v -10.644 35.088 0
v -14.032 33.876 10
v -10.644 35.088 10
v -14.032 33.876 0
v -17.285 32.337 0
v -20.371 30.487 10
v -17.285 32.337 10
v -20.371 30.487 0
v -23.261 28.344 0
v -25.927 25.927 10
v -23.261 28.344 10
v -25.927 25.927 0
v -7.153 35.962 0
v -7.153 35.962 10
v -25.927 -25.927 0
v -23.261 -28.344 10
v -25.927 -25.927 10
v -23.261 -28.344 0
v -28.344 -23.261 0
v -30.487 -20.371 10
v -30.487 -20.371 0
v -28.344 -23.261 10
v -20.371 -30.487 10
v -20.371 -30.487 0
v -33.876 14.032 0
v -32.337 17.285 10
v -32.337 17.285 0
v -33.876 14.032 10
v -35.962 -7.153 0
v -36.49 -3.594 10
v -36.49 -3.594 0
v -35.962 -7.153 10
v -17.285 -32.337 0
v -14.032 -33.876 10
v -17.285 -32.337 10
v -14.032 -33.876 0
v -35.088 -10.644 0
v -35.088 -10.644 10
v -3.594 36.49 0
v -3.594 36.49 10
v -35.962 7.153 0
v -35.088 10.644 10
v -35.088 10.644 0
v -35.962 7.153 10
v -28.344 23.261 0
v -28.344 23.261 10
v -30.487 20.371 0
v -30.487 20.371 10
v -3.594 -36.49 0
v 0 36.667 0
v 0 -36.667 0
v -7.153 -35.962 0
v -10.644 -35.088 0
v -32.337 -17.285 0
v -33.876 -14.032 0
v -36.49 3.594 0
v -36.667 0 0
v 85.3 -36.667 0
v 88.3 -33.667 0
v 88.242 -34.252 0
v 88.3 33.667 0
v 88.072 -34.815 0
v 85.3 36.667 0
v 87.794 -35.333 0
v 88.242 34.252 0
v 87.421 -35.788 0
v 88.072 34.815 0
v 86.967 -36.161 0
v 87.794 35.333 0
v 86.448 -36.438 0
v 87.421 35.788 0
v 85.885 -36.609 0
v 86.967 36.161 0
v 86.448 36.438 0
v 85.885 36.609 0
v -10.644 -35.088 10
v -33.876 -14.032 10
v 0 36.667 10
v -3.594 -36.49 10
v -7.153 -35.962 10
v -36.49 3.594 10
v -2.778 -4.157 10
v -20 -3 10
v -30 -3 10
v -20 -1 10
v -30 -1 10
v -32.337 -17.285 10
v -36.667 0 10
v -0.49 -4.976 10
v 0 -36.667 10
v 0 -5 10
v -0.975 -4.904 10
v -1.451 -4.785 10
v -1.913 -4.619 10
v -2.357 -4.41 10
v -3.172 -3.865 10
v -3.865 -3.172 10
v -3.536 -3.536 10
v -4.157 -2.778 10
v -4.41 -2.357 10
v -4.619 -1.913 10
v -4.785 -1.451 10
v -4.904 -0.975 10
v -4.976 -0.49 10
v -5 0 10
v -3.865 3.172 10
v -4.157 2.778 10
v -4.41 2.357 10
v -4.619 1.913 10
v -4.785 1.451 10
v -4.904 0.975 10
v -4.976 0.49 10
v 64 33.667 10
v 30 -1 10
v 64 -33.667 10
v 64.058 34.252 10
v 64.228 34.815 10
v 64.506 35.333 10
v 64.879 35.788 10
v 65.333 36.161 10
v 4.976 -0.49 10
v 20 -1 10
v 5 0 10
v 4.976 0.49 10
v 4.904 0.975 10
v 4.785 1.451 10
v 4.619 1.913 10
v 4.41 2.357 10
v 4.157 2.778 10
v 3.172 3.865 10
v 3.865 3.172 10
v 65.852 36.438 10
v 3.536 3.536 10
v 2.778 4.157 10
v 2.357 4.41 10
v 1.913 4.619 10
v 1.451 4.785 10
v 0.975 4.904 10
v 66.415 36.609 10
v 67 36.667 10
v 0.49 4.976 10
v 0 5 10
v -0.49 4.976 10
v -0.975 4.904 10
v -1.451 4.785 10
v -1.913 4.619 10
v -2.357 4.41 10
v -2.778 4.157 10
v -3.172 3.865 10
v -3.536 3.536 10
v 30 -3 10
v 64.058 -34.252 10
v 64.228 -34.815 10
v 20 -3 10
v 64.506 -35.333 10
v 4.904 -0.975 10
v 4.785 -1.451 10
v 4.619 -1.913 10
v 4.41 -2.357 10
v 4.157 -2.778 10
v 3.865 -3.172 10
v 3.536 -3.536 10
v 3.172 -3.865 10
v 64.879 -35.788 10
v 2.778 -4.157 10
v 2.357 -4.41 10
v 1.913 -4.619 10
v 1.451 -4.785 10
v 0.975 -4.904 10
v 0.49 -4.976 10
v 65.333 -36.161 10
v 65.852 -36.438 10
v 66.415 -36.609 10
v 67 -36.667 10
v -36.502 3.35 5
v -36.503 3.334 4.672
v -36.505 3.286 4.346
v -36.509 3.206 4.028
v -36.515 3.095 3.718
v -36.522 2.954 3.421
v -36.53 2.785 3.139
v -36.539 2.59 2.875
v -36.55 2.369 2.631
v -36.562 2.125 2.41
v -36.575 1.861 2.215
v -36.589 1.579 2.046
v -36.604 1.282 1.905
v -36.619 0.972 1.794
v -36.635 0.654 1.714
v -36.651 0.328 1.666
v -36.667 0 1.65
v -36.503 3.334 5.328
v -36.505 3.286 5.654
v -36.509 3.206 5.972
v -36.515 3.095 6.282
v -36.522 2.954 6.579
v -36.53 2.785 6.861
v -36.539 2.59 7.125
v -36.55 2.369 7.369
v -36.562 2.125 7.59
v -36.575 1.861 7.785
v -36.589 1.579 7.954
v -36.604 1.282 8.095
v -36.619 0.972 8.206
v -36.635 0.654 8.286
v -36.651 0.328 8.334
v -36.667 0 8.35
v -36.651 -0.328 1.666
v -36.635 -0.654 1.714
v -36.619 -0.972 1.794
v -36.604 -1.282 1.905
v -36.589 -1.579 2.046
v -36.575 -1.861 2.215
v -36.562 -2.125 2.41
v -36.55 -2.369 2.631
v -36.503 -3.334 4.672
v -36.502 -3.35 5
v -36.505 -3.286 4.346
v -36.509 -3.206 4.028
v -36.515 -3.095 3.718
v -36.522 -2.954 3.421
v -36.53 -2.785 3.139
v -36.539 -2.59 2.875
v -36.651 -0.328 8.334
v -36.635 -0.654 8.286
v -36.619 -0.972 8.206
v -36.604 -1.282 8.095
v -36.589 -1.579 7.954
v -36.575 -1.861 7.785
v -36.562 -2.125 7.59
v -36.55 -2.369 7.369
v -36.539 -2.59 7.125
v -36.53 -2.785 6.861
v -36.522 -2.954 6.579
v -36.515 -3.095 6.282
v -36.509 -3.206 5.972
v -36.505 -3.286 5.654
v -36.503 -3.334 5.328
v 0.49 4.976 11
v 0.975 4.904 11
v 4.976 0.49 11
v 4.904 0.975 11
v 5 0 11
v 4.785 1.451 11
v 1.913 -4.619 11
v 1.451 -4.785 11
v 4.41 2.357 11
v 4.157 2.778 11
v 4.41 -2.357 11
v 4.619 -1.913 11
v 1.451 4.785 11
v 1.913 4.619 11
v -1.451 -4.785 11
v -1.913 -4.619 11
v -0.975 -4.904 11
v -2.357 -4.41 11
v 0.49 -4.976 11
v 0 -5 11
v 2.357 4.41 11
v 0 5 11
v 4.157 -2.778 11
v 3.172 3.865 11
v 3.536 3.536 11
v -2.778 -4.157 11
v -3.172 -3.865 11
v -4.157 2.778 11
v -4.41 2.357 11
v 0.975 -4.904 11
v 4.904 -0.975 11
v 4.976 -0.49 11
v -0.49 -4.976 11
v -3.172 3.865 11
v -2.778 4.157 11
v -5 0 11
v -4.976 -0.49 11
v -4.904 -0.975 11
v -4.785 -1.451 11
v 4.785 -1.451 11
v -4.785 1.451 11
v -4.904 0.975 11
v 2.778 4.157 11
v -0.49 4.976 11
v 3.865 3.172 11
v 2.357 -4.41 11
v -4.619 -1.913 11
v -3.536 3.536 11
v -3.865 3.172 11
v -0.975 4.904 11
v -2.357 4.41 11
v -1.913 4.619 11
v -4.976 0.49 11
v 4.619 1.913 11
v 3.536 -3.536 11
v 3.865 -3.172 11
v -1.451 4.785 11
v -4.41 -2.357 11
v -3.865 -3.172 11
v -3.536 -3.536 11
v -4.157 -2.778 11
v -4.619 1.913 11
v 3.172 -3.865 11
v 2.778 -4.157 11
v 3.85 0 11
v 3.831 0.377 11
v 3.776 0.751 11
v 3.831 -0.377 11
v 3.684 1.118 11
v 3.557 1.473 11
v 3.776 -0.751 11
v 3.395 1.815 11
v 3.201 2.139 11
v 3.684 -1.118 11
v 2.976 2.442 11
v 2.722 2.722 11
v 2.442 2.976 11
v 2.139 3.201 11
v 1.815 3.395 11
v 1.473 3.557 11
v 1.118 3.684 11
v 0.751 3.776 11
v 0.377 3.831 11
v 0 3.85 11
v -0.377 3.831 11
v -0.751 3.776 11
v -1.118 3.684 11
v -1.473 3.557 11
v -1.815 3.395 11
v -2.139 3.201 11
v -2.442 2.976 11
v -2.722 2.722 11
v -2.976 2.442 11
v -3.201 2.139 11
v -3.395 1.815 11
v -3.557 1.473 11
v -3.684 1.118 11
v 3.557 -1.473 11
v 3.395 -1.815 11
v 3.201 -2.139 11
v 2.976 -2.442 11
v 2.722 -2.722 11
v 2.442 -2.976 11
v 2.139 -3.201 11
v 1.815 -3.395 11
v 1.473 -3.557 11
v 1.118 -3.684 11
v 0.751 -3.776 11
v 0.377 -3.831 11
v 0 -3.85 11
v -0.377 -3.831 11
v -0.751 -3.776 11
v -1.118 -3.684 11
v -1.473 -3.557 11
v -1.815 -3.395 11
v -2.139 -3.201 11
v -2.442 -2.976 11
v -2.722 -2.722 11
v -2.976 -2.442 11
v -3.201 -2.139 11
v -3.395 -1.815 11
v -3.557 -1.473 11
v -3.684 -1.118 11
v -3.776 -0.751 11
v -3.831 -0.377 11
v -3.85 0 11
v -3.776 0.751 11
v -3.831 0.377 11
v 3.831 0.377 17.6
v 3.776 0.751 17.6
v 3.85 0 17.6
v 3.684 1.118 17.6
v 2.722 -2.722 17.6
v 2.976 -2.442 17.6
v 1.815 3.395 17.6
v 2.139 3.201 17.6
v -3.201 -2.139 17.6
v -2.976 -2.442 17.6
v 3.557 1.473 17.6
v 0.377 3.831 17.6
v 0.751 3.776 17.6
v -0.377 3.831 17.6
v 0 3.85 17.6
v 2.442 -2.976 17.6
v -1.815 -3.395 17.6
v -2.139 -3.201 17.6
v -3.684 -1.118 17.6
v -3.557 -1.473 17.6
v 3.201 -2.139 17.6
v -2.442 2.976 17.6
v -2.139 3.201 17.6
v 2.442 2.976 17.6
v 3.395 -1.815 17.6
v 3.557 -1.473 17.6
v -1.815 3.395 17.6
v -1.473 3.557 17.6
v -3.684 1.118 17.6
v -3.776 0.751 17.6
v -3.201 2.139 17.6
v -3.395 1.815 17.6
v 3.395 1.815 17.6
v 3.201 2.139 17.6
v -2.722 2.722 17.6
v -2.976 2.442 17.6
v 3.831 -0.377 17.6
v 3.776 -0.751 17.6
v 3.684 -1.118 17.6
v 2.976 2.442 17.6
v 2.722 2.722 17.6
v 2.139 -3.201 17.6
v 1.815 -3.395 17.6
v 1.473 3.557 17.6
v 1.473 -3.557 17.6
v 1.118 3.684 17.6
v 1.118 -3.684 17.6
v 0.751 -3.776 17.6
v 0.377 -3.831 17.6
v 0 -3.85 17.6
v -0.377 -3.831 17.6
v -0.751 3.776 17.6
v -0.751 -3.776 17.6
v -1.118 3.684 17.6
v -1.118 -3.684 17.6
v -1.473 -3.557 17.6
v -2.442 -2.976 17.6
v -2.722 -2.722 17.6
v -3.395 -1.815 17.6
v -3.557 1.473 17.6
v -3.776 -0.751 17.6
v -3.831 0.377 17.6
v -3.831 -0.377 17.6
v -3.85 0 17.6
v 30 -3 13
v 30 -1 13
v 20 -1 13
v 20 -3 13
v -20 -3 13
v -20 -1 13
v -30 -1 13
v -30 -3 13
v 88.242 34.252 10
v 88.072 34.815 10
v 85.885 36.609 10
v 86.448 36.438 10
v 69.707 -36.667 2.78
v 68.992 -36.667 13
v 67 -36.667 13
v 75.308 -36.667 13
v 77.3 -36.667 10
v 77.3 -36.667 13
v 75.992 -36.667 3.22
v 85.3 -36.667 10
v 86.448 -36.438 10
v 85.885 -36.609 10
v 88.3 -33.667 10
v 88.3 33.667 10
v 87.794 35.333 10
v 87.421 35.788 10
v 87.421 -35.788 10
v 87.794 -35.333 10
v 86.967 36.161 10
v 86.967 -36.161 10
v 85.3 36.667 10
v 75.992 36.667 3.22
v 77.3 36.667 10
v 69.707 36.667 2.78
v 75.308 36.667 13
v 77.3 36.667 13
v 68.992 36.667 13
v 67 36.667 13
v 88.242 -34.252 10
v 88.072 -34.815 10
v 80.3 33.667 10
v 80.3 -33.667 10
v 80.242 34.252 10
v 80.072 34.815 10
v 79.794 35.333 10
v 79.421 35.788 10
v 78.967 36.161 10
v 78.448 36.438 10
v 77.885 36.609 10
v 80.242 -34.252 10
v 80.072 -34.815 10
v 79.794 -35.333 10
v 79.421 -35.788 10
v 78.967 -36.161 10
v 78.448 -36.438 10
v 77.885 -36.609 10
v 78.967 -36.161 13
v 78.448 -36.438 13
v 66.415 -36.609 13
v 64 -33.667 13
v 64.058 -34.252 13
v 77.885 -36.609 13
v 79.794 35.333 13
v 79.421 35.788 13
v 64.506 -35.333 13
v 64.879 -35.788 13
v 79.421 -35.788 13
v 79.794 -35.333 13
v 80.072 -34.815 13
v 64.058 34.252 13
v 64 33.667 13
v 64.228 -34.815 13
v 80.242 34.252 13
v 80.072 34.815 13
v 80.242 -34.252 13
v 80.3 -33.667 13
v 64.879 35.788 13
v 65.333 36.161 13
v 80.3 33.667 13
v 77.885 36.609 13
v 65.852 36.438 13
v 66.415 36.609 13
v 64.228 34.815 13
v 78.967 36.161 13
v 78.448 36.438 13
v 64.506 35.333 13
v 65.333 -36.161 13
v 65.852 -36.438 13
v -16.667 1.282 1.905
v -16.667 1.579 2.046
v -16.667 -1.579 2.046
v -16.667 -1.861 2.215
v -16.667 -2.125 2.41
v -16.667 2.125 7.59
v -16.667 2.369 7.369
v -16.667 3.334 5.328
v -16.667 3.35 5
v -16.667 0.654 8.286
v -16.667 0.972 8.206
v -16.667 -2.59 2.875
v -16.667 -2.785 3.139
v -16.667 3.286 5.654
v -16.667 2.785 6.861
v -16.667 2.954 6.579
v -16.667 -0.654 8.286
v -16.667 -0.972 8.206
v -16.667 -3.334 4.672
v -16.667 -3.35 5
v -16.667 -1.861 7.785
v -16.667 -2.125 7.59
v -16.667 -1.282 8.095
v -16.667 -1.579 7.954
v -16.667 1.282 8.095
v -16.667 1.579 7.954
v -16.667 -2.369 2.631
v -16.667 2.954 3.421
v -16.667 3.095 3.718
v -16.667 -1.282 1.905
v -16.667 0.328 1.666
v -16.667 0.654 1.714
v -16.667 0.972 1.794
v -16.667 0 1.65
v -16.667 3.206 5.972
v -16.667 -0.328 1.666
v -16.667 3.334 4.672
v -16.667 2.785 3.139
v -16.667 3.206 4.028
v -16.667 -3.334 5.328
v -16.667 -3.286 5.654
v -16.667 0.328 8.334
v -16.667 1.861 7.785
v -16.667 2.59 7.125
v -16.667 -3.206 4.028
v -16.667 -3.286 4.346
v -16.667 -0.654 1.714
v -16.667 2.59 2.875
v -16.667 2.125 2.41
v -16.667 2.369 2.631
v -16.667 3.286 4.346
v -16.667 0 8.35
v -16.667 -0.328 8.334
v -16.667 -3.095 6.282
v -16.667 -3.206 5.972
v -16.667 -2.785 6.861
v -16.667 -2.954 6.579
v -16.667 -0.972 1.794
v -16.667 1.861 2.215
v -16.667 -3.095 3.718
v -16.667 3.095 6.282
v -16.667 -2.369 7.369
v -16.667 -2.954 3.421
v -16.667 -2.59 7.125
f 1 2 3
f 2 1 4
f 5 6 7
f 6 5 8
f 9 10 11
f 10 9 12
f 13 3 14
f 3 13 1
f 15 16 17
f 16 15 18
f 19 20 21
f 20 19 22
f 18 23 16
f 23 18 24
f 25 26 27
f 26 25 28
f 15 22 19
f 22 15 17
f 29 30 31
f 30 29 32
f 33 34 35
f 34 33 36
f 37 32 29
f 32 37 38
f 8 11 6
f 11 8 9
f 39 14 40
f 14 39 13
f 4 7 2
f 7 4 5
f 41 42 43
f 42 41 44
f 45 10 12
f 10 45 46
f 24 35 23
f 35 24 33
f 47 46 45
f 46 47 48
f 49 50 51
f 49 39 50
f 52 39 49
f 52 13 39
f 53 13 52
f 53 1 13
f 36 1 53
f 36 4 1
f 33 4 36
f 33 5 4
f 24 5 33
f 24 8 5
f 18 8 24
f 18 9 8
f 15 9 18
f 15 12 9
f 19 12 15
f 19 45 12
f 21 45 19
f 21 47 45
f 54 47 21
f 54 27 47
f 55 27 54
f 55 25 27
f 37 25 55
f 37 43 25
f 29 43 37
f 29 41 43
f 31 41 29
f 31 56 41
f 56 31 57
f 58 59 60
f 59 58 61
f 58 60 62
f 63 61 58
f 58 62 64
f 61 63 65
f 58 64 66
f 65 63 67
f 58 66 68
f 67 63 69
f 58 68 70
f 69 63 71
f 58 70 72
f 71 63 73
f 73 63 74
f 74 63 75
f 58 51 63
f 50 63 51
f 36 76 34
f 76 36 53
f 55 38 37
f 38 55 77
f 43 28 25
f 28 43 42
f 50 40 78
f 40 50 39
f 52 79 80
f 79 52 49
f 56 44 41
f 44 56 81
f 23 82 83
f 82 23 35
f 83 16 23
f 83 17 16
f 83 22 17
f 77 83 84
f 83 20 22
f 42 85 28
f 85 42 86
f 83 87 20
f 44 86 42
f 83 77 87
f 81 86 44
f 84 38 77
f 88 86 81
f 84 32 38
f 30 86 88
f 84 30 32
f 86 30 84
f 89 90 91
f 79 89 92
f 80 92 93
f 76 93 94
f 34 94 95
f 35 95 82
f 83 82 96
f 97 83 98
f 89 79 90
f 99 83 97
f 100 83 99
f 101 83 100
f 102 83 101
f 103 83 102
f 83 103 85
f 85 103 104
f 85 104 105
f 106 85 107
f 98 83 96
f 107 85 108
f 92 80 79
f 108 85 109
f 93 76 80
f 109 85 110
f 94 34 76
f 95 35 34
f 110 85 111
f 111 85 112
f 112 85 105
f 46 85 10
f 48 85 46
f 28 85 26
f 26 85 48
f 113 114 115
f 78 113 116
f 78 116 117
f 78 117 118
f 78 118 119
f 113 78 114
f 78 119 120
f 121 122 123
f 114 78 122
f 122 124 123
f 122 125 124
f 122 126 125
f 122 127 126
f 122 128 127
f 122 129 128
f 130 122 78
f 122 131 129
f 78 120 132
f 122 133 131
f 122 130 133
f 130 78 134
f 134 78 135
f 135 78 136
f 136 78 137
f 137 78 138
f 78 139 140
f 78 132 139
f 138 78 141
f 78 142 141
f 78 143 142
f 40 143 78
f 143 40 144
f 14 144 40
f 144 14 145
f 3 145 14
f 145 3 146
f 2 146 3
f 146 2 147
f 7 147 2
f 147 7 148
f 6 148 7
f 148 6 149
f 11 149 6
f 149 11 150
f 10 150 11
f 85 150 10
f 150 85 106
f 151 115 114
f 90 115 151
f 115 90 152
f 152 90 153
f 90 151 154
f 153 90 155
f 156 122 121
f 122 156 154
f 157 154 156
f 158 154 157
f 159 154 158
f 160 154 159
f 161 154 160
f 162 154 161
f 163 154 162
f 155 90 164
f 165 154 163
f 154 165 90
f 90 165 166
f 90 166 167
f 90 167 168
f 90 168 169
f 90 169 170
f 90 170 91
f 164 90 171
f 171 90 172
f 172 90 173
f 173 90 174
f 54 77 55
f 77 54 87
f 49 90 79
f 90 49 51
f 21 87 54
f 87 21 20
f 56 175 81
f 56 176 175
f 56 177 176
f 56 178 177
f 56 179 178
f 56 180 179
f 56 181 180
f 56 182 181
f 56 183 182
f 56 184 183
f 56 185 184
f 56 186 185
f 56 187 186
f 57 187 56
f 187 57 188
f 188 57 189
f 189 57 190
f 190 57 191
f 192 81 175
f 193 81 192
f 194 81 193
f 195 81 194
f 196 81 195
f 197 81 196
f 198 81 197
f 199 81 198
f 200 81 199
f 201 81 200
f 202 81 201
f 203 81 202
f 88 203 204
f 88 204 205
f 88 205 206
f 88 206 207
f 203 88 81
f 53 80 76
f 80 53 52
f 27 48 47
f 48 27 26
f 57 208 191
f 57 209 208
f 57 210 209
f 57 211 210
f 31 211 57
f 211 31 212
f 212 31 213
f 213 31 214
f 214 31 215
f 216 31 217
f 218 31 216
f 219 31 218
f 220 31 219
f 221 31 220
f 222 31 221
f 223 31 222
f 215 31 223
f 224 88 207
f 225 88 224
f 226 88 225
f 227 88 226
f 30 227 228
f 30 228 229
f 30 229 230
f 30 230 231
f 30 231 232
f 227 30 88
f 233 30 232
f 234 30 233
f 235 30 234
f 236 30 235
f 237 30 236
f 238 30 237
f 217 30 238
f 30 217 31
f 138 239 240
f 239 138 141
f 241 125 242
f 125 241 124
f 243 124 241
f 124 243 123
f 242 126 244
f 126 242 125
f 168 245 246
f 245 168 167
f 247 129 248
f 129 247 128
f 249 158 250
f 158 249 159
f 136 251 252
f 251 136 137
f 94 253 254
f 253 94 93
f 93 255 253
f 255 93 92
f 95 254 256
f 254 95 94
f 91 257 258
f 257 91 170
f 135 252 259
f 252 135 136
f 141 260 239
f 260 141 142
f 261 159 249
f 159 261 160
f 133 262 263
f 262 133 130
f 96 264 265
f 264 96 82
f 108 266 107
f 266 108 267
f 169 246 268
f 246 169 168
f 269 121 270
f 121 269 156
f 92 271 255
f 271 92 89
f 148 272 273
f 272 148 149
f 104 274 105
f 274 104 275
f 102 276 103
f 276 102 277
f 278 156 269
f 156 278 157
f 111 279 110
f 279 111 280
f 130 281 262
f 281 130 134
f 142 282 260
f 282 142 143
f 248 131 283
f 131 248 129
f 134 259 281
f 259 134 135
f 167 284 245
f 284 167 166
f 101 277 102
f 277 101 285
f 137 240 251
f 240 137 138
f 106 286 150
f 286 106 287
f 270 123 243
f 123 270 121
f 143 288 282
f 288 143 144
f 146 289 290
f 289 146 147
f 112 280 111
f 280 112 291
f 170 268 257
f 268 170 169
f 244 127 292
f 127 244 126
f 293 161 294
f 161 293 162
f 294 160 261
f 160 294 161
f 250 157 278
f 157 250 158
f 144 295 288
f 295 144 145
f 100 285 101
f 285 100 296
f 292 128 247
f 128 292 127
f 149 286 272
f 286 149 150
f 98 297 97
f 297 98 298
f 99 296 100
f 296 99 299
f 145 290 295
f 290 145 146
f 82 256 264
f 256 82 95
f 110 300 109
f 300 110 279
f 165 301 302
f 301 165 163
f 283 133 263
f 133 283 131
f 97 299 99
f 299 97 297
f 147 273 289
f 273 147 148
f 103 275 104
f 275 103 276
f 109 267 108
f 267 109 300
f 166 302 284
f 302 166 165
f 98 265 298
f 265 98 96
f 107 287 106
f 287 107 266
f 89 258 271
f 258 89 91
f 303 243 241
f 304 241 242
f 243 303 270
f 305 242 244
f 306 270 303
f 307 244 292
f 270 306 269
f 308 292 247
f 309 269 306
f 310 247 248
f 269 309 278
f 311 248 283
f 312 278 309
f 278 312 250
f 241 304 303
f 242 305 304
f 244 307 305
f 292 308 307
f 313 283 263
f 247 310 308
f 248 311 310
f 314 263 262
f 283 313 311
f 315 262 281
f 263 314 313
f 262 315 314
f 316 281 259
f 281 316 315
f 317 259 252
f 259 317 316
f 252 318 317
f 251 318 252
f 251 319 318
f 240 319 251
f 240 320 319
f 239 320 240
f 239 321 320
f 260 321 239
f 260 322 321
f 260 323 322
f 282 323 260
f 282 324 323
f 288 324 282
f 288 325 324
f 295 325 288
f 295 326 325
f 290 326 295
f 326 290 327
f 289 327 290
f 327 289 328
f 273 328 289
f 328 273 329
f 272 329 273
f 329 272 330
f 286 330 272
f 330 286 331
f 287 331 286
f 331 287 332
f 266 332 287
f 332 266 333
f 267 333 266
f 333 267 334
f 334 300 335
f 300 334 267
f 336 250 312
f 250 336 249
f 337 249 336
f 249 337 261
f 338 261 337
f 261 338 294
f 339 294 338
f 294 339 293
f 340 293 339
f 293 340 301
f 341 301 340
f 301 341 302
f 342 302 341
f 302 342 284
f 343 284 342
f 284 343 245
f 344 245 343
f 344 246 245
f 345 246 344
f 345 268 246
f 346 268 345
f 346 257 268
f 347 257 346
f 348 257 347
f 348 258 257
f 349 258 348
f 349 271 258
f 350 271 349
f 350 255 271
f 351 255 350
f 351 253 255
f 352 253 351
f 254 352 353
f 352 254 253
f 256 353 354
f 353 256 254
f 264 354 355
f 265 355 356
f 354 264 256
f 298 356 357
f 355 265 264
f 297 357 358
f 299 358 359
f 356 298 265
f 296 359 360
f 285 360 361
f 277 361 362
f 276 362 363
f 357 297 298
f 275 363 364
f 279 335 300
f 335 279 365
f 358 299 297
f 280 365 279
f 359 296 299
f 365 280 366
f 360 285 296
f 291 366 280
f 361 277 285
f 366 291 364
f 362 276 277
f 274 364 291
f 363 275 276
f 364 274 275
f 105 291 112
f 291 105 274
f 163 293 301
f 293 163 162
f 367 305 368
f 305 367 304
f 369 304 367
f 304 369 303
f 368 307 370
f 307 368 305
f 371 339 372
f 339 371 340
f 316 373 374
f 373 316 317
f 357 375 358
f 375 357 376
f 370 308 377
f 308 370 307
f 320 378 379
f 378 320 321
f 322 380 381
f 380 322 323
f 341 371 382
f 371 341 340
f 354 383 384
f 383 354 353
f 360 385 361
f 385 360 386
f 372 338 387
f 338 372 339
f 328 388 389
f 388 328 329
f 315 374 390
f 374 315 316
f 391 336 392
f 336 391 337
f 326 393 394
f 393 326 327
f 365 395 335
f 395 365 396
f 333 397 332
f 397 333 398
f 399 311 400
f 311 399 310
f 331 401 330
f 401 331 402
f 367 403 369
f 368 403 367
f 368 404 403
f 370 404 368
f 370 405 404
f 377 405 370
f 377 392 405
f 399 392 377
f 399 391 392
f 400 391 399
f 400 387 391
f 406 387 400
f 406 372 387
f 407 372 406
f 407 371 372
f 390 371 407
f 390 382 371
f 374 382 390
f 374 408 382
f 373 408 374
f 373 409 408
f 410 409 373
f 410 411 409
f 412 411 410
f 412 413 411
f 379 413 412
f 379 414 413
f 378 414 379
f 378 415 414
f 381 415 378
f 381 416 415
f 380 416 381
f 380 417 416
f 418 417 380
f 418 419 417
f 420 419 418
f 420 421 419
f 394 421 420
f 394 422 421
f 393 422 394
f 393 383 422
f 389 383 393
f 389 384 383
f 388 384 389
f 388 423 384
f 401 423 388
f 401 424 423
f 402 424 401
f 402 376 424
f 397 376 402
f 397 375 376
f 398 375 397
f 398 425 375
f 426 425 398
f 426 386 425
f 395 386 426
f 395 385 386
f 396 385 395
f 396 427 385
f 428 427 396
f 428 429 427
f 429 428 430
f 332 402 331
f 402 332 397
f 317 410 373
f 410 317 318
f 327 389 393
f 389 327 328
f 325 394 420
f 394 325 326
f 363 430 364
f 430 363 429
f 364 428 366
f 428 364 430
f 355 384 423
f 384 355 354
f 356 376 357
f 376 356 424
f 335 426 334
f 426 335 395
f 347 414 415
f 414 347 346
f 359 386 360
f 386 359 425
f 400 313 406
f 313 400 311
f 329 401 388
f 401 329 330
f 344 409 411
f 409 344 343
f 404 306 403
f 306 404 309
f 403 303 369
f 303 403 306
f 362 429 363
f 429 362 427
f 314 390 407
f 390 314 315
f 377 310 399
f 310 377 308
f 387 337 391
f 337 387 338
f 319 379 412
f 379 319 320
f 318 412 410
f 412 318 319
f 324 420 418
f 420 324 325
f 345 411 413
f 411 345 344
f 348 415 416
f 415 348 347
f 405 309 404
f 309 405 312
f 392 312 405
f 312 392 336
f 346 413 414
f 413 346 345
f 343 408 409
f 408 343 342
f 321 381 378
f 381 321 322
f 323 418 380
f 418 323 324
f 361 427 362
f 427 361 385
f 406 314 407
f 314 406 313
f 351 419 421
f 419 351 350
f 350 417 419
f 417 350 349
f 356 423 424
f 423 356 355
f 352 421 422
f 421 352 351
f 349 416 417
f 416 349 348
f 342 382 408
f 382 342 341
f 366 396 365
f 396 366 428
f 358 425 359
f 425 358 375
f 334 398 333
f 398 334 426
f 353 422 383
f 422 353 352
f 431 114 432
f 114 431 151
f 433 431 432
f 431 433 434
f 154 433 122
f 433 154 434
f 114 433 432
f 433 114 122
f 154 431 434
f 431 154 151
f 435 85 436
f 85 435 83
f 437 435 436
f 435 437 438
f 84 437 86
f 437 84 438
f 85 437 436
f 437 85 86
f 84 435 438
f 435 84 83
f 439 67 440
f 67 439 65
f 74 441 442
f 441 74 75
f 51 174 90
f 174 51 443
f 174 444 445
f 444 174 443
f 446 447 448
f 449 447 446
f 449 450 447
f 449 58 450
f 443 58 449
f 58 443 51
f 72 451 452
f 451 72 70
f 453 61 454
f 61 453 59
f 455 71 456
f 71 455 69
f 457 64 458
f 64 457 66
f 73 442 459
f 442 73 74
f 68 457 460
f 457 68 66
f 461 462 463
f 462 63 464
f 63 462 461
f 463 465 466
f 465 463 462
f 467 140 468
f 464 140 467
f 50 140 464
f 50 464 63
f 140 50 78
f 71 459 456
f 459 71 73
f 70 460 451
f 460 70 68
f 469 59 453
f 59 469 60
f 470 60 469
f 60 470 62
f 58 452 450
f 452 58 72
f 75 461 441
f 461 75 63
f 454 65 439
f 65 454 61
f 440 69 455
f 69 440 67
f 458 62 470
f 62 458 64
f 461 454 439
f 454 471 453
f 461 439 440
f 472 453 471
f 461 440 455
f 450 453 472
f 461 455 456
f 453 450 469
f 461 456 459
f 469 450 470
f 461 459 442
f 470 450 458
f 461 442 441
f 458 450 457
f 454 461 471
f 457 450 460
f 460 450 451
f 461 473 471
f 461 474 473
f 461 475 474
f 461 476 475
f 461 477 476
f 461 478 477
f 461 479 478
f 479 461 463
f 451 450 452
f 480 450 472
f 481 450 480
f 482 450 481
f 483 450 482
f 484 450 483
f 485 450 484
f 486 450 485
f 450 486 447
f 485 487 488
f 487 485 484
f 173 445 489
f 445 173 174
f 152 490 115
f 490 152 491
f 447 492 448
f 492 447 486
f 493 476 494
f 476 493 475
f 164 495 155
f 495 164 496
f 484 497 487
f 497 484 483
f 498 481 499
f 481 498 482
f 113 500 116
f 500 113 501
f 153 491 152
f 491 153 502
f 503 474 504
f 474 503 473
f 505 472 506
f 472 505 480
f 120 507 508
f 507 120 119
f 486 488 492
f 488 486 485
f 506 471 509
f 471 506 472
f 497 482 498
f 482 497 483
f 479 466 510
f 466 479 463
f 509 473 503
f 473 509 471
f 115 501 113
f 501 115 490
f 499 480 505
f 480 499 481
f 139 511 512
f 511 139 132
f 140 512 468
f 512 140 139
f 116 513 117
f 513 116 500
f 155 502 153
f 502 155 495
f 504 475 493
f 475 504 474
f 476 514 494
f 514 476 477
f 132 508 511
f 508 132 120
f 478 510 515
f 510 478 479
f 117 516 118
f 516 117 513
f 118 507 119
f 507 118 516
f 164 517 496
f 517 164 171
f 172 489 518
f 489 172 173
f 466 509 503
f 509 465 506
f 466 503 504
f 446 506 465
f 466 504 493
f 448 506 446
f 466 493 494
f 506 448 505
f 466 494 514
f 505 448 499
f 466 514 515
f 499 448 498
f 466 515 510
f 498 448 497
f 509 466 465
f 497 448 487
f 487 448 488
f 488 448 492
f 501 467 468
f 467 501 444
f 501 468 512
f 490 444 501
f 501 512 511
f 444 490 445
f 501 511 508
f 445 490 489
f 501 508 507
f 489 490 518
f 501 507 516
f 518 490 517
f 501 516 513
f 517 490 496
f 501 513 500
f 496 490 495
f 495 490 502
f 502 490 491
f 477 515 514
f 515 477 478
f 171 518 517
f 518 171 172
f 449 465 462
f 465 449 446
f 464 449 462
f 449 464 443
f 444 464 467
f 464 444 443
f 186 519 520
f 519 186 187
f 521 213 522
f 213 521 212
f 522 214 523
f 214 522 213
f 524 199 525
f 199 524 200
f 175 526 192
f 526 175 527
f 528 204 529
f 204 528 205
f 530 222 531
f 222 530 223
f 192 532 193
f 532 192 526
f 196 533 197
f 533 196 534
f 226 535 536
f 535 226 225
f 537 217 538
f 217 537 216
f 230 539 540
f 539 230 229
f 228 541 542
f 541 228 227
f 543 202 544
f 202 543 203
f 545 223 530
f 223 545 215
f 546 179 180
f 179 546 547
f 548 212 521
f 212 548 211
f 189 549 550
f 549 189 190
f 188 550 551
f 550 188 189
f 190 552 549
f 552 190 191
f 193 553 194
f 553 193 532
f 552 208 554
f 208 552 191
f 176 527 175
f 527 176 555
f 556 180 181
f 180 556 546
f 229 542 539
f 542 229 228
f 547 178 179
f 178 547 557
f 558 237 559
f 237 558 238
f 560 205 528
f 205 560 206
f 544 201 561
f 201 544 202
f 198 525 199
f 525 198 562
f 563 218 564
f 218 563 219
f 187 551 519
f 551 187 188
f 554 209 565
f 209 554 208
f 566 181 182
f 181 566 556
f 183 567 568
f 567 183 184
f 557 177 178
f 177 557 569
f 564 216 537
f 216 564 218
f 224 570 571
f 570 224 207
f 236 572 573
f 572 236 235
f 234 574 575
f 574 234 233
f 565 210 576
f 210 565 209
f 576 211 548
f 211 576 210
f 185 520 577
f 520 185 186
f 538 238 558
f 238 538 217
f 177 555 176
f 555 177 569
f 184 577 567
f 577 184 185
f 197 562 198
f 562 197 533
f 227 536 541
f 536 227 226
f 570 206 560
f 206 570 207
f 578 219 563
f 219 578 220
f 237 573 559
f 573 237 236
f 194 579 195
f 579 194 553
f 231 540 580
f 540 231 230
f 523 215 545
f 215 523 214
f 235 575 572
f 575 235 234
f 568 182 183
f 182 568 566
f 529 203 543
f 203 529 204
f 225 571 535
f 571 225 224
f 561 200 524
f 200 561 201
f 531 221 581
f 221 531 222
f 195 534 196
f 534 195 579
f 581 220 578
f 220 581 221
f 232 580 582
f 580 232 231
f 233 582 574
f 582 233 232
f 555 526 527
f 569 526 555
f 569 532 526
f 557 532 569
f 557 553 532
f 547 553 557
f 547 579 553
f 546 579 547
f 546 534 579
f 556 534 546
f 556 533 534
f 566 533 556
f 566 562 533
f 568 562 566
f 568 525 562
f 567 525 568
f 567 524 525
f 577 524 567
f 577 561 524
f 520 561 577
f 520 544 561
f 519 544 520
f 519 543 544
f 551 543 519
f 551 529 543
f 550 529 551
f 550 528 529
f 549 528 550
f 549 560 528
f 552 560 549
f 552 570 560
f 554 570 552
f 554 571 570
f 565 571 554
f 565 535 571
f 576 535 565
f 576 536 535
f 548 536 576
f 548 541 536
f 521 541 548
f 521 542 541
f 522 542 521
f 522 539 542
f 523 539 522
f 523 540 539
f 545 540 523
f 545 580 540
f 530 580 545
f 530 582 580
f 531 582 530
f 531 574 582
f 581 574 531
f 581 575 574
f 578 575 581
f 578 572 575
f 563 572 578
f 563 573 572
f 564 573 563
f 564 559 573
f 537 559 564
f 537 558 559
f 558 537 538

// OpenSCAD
// ===================================================================
// Mirror + Spinner Stand (stationary base)
//
// The stationary half of the lazy-susan mirror stand: merges the
// lazy-susan base disc with the leaning mirror stand into one solid
// piece. The rotating 3-arm spinner that sits on top is a separate
// part -- see spinner.scad.
//
// The mirror stand's flat plate overlaps the lazy susan's stationary
// base disc all the way to the disc's center (the spinner axis),
// rather than just touching its edge. The disc stays a full circle
// underneath (so the small center post that the spinner's bearing
// insert mounts to stays solid, not cut in half) but the rectangle
// covers its entire back half, so in silhouette the fused base reads
// as a true Norman window -- a semicircle capping a rectangle, one
// continuous outline with no notch, gap, or seam.
//
// Only the raised boss (the part tall enough to reach the spinner's
// rotation plane) is set back far enough that it sits mirror_clearance
// mm beyond the circle the spinner's arm tips sweep out (spinner_
// sweep_radius below, which must match spinner.scad's own value), so
// the arms spin freely and just barely miss it. The thin flat plate
// itself can safely run right through the spinner's footprint because
// it's well below spinner height -- only the boss needs the clearance.
//
// An optional pair of tabs rises from the base's floor and interlocks
// with a matching tab on the underside of the spinner's pointed
// (90-degree) arm (see spinner.scad's spinner_stop_tab()) to limit the
// spinner to exactly 180 degrees of travel: from the pointer aimed at
// the mirror to aimed directly away from it. Toggle it with
// has_rotation_stop below; spinner.scad has its own independent
// toggle for its half of the mechanism, so set both true for the stop
// to actually work.
//
// Axes: X/Y = footprint, Z = up, sits on Z = 0. The base disc is
// centered on the origin (the spinner axis); the mirror stand sits
// behind it along +X, centered on Y = 0, leaning back away from the
// spinner (its mirror faces toward -X, i.e. toward the spinner).
// ===================================================================

/* [Lazy susan base dimensions (mm)] */
base_height_no_tether = 3;    // thickness of the base disc when has_tether_dowel is false; when true, the disc is instead made as thick as tether_base_height so the tether hole sits fully within it -- see base_height below
base_radius           = 110 / 3;  // must match object_width / 3, where object_width matches spinner.scad
base_center_diameter = 10;
base_center_extra    = 1;    // center cylinder rises this much above base_height
base_top_extra       = 6.6;  // top post rises this much above center cylinder
base_top_radius      = 3.85;

/* [Mirror] */
mirror_base_depth = 6;   // front-to-back thickness of the mirror's plastic base

/* [Mirror lean] */
lean_angle = 86;          // desired angle of the mirror from horizontal (90 = vertical)
tilt = -(90 - lean_angle); // negative so the slot leans the mirror toward its front edge

/* [Mirror slot] */
eps = 0.3;                            // clearance so the mirror base slides in freely
slot_gap   = mirror_base_depth + eps; // front-to-back width of the slot
slot_depth = 10;                      // vertical depth of the (blind) slot

/* [Mirror stand base] */
// stand_width matches the lazy-susan base disc's diameter, and
// plate_thickness matches base_height, and front_apron is derived from
// the spinner clearance below (under Derived values) -- see there for
// why these aren't free parameters here.
back_apron      = 13;   // X: plate material behind the slot
floor_thickness = 3;    // solid material below the slot floor (within the boss)
boss_margin     = 5;    // X: extra boss material in front of and behind the slot

/* [Mirror stand corners] */
plate_corner_radius = 3;  // rounding radius of the plate's back two footprint corners
boss_corner_radius  = 3;  // rounding radius of the boss's footprint corners
corner_fn = 32;            // smoothness of the rounded corners

/* [Fit between spinner and mirror stand] */
// Radius of the circle swept by the spinner arms' rounded tips (arm_length
// + arm_width / 2 in spinner.scad); must match spinner.scad's
// spinner_sweep_radius.
spinner_sweep_radius = 62.5;
// Extra gap, beyond the bare minimum, between that swept circle and the
// mirror stand's front edge.
mirror_clearance = 1.5;

/* [Rotation stop] */
has_rotation_stop = true;  // adds the two tabs that limit spinner rotation to 180 degrees; must match spinner.scad's has_rotation_stop for the stop to work
// A tab hanging below the spinner's pointed (90-degree) arm, plus two
// matching tabs rising from the base, limit the spinner to exactly 180
// degrees of rotation: from the pointed arm aimed at the mirror to
// aimed directly away from it. All three tabs share the same radial
// span and width; see the Derived values / module comments below for
// how they're positioned to interlock.
stop_width = 2;   // mm, tangential width of each stop tab; must match spinner.scad
stop_r_in  = 20;  // mm, inner radius of the stop tabs; must match spinner.scad
stop_r_out = 30;  // mm, outer radius of the stop tabs; must match spinner.scad
stop_rise  = 3;   // mm, how far the base's tabs rise above the floor

/* [Tether dowel hole (mm)] */
// Bores a horizontal hole into the lazy-susan base disc's edge, on the
// opposite side from the mirror, sized for a dowel that ties this
// stand to dowel-stand.scad at a fixed distance. Toggle it with
// has_tether_dowel below; dowel-stand.scad has its own independent
// toggle for its matching hole, so set both true to use the tether.
// Also thickens the base disc (see tether_base_height) so the hole
// sits fully within it, not breaking through the top or bottom face.
// Since the hole is bored into the disc rather than protruding above
// it, it needs no clearance from the spinner regardless of depth.
has_tether_dowel   = true;
dowel_diameter     = 6.7; // actual diameter of the connecting dowel; must match dowel-stand.scad and window.scad
hole_clearance     = 0;   // added to dowel_diameter for a snug press/slide fit; must match dowel-stand.scad and window.scad
tether_base_height = 10;  // mm, thickness the base disc is made when has_tether_dowel is true (replacing base_height_no_tether), giving the hole enough surrounding material
dowel_hole_depth   = 20;  // mm, how deep this hole is bored into the base disc from its edge; must match dowel_hole_depth in dowel-stand.scad and window.scad

/* [Preview / debug helpers] */
stand_color = "DeepSkyBlue";

$fn = 64;

// Computed ahead of the checks below (rather than in the main Derived
// values section further down) because those checks depend on them:
// when the tether dowel is enabled, the disc's thickness matches
// tether_base_height so the tether hole sits fully within the full
// slab, top and bottom, instead of breaking through.
base_height  = has_tether_dowel ? tether_base_height : base_height_no_tether;
dowel_hole_d = dowel_diameter + hole_clearance;

// ===== Checks =====
assert(base_height > 0 && base_radius > 0,
    "base_height and base_radius must be positive");
assert(base_center_diameter > 0 && base_top_radius > 0,
    "base_center_diameter and base_top_radius must be positive");
assert(mirror_clearance >= 0, "mirror_clearance must not be negative");
assert(stop_width > 0, "stop_width must be positive");
assert(stop_r_in > 0 && stop_r_in < stop_r_out,
    "stop_r_in must be positive and less than stop_r_out");
assert(stop_r_out < base_radius,
    "stop_r_out must be less than base_radius so the away-from-mirror base tab has a full disc under it");
assert(stop_rise > 0, "stop_rise must be positive");
assert(!has_tether_dowel || tether_base_height > dowel_hole_d,
    "tether_base_height must be larger than the dowel hole diameter so the tether hole doesn't break through the disc's top or bottom face");
assert(!has_tether_dowel || dowel_hole_depth > 0,
    "dowel_hole_depth must be positive");
// The hole is centered on Y=0, pointing straight at the spinner axis,
// so its blind end must stay far enough from the origin (by its own
// radius, plus the center post's) to not break into the center post.
assert(!has_tether_dowel ||
    base_radius - dowel_hole_depth > dowel_hole_d / 2 + base_center_diameter / 2,
    "dowel_hole_depth is too deep and would break into the center post; decrease dowel_hole_depth");

// ===== Derived values =====

// The mirror stand's width matches the lazy-susan base disc's diameter,
// so the stand reads as a continuation of the disc rather than a
// mismatched width.
stand_width = 2 * base_radius;

// The mirror plate is the same thickness as the lazy-susan base, so
// the two flat footprints fuse into one seamless "Norman window" shape
// (circle + rectangle, sharing one flat top face) with no bridge piece
// and no seam.
plate_thickness = base_height;

// Front-to-back footprint of the mirror stand's slot boss.
boss_depth = slot_gap + 2 * boss_margin;
boss_height = slot_depth + floor_thickness;        // Z: total height at the boss, from Z=0

// The mirror stand's local origin (X = 0, its front-left corner in
// mirror_stand.scad's own axes) sits at the spinner axis itself -- the
// rectangle's flat front edge passes right through the disc's center,
// covering the disc's whole front half. No cutting is needed: the disc
// stays a full circle underneath (so the center post / bearing mount
// stays solid and full-strength), and the union of full-circle disc +
// rectangle-through-the-center reads, in silhouette, as exactly a
// Norman window (semicircle capping a rectangle) -- the rectangle
// simply overlaps and covers where the disc's front half would show.
stand_origin_x = 0;
stand_origin_y = -stand_width / 2;

// Local-to-the-stand X position of the boss's near (front) edge: far
// enough from the world origin (spinner axis) that the boss clears the
// spinner's swept circle by mirror_clearance.
boss_near_x = spinner_sweep_radius + mirror_clearance - stand_origin_x;
slot_x      = boss_near_x + boss_margin + slot_gap / 2; // X: center of the slot, local to the stand

front_apron = slot_x - slot_gap / 2; // X: plate material in front of the slot, local to the stand
base_depth  = front_apron + slot_gap + back_apron; // X: total mirror-stand footprint depth

assert(boss_near_x >= 0,
    "mirror stand's boss would start before the disc's edge; increase mirror_clearance or base_radius, or decrease spinner_sweep_radius");

// ===== Lazy susan base geometry =====

module lazy_susan_base() {
    union() {
        cylinder(r = base_radius, h = base_height);
        cylinder(d = base_center_diameter, h = base_height + base_center_extra);
        translate([0, 0, base_height + base_center_extra])
            cylinder(r = base_top_radius, h = base_top_extra);
    }
}

// Horizontal hole bored into the lazy-susan base disc's edge, centered
// on Y=0 so it sits on the disc's semicircle centerline and points
// straight at the spinner axis -- open at the outer edge, blind at the
// inner end. Sized for a dowel that spans over to the matching hole on
// dowel-stand.scad, holding the two stands a fixed distance apart. It
// never collides with the away-from-mirror rotation-stop tab: the tab
// rises from Z=base_height upward, while the hole sits at the disc's
// mid-thickness (Z=base_height/2) and stays below Z=base_height by
// construction (see the tether_base_height > dowel_hole_d check above).
module tether_hole() {
    overcut = 1; // extra length so the cutter fully clears the disc's outer surface
    translate([-(base_radius + overcut), 0, base_height / 2])
        rotate([0, 90, 0])
            cylinder(d = dowel_hole_d, h = dowel_hole_depth + overcut);
}

// Rotation-stop tabs on the base: two ribs, stop_rise mm tall, rising
// from the floor (Z = base_height). One sits just past the "toward
// mirror" radial line (+X, X from stop_r_in to stop_r_out) and the
// other just past the "away from mirror" line (-X, mirrored). Both are
// offset stop_width / 2 to the -Y side of their line (rather than
// centered on it): since the spinner's tab is centered on its own line
// when it's aimed exactly at (or away from) the mirror, offsetting the
// base tab by half the spinner tab's width means the two tabs' facing
// edges meet exactly at that moment, not before or after it. Both
// tabs use the same -Y offset -- not mirrored left/right -- because
// that is the side that blocks the spinner from swinging past either
// end of its 180-degree arc; see the geometry note below.
//
// Geometry: picture the spinner tab starting centered on the +X line
// (pointer aimed at the mirror), resting against the first base tab.
// Rotating the spinner counterclockwise lifts its tab away (+Y) from
// that base tab and sweeps it through the +Y half-plane; by the time
// it reaches the -X line (pointer aimed away from the mirror), the
// tab has swung back down to meet the second base tab from the same
// -Y side. So both stops sit on -Y, and the spinner is confined to the
// 180-degree arc between them.
module base_stop_tab(x0, x1) {
    translate([x0, -(stop_width / 2 + stop_width), base_height])
        cube([x1 - x0, stop_width, stop_rise]);
}

module base_stop_tabs() {
    union() {
        base_stop_tab(stop_r_in, stop_r_out);    // toward the mirror (+X)
        base_stop_tab(-stop_r_out, -stop_r_in);  // away from the mirror (-X)
    }
}

// ===== Mirror stand geometry (stand_width is derived from base_radius,
// plate_thickness matches base_height, and the plate's front edge is
// square instead of rounded -- it sits buried inside the disc's front
// half rather than at a visible seam, but square keeps the overlap
// simple and fully solid) =====

// A box with its footprint (XY) corners rounded, straight from Z=0 to h.
module rounded_box(x, y, h, r) {
    assert(r <= min(x, y) / 2, "rounded_box: corner radius too large for box footprint");
    hull() {
        for (i = [r, x - r], j = [r, y - r])
            translate([i, j, 0])
                cylinder(r = r, h = h, $fn = corner_fn);
    }
}

// Like rounded_box, but only the two corners at X = x (the far/back
// end) are rounded; the two corners at X = 0 stay square. Used for the
// mirror plate, whose front edge sits at the spinner axis, buried
// inside the lazy-susan disc's front half.
module back_rounded_box(x, y, h, r) {
    assert(r <= min(x, y) / 2, "back_rounded_box: corner radius too large for box footprint");
    hull() {
        cube([0.001, y, h]);
        for (j = [r, y - r])
            translate([x - r, j, 0])
                cylinder(r = r, h = h, $fn = corner_fn);
    }
}

module mirror_plate() {
    back_rounded_box(base_depth, stand_width, plate_thickness, plate_corner_radius);
}

module mirror_boss() {
    translate([slot_x - boss_depth / 2, 0, 0])
        rounded_box(boss_depth, stand_width, boss_height, boss_corner_radius);
}

module mirror_slot_cutter() {
    overcut   = 4;  // extra length so the cutter fully clears both sides of the stand
    top_pad   = 2;  // extra length so the cutter pokes above the top face for a clean cut
    cutter_len = slot_depth / cos(tilt) + top_pad;

    translate([slot_x, stand_width / 2, boss_height])
        rotate([0, tilt, 0])
            translate([-slot_gap / 2, -stand_width / 2 - overcut / 2, top_pad - cutter_len])
                cube([slot_gap, stand_width + overcut, cutter_len]);
}

module mirror_stand() {
    difference() {
        union() {
            mirror_plate();
            mirror_boss();
        }
        mirror_slot_cutter();
    }
}

// ===== Combined base: lazy susan base disc fused with the mirror
// stand's flat plate, overlapping all the way to the disc's center
// (no gap, no bridge). The disc stays a full circle for a solid center
// post, but the rectangle covers its back half, so the outline reads
// as a Norman window: rectangle capped by a semicircle. Only the
// raised boss, which actually reaches spinner height, is set back to
// clear the spinning arms. =====

module base_and_mirror_stand() {
    difference() {
        union() {
            lazy_susan_base();
            if (has_rotation_stop)
                base_stop_tabs();
            translate([stand_origin_x, stand_origin_y, 0])
                mirror_stand();
        }
        if (has_tether_dowel)
            tether_hole();
    }
}

echo(str("Lazy susan base: r=", base_radius, " mm, h=", base_height,
         " mm, center d=", base_center_diameter,
         " mm, top post r=", base_top_radius, " mm"));
echo(str("Mirror stand: base_depth=", base_depth, " mm, stand_width=", stand_width,
         " mm (matches lazy-susan base diameter), flat plate flush against the disc (no gap)"));
echo(str("Mirror stand boss (holds the mirror) sits at X=", stand_origin_x + boss_near_x,
         " mm from the spinner axis, ", mirror_clearance,
         " mm beyond the spinner's swept circle (radius ", spinner_sweep_radius, " mm)"));
echo(has_rotation_stop
    ? str("Rotation stop tabs: r=", stop_r_in, " to r=", stop_r_out,
          " mm, ", stop_width, " mm wide -- limits the spinner to 180 degrees",
          " (pointer at the mirror to pointer away from it)")
    : "Rotation stop tabs: disabled");
echo(has_tether_dowel
    ? str("Tether dowel hole: d=", dowel_hole_d, " mm, ", dowel_hole_depth,
          " mm deep, bored into the base disc's edge, away from the mirror; base disc thickness raised to match (h=", base_height, " mm)")
    : "Tether dowel hole: disabled");

color(stand_color) base_and_mirror_stand();

// ===================================================================
// Printing notes
// ===================================================================
// Print flat side down (Z = 0); the two base stop tabs (if enabled)
// and the mirror boss rise from that same flat face, so this needs no
// supports. The tether dowel hole (if enabled) is a horizontal bore --
// small enough in diameter to bridge cleanly without supports.
// ===================================================================
